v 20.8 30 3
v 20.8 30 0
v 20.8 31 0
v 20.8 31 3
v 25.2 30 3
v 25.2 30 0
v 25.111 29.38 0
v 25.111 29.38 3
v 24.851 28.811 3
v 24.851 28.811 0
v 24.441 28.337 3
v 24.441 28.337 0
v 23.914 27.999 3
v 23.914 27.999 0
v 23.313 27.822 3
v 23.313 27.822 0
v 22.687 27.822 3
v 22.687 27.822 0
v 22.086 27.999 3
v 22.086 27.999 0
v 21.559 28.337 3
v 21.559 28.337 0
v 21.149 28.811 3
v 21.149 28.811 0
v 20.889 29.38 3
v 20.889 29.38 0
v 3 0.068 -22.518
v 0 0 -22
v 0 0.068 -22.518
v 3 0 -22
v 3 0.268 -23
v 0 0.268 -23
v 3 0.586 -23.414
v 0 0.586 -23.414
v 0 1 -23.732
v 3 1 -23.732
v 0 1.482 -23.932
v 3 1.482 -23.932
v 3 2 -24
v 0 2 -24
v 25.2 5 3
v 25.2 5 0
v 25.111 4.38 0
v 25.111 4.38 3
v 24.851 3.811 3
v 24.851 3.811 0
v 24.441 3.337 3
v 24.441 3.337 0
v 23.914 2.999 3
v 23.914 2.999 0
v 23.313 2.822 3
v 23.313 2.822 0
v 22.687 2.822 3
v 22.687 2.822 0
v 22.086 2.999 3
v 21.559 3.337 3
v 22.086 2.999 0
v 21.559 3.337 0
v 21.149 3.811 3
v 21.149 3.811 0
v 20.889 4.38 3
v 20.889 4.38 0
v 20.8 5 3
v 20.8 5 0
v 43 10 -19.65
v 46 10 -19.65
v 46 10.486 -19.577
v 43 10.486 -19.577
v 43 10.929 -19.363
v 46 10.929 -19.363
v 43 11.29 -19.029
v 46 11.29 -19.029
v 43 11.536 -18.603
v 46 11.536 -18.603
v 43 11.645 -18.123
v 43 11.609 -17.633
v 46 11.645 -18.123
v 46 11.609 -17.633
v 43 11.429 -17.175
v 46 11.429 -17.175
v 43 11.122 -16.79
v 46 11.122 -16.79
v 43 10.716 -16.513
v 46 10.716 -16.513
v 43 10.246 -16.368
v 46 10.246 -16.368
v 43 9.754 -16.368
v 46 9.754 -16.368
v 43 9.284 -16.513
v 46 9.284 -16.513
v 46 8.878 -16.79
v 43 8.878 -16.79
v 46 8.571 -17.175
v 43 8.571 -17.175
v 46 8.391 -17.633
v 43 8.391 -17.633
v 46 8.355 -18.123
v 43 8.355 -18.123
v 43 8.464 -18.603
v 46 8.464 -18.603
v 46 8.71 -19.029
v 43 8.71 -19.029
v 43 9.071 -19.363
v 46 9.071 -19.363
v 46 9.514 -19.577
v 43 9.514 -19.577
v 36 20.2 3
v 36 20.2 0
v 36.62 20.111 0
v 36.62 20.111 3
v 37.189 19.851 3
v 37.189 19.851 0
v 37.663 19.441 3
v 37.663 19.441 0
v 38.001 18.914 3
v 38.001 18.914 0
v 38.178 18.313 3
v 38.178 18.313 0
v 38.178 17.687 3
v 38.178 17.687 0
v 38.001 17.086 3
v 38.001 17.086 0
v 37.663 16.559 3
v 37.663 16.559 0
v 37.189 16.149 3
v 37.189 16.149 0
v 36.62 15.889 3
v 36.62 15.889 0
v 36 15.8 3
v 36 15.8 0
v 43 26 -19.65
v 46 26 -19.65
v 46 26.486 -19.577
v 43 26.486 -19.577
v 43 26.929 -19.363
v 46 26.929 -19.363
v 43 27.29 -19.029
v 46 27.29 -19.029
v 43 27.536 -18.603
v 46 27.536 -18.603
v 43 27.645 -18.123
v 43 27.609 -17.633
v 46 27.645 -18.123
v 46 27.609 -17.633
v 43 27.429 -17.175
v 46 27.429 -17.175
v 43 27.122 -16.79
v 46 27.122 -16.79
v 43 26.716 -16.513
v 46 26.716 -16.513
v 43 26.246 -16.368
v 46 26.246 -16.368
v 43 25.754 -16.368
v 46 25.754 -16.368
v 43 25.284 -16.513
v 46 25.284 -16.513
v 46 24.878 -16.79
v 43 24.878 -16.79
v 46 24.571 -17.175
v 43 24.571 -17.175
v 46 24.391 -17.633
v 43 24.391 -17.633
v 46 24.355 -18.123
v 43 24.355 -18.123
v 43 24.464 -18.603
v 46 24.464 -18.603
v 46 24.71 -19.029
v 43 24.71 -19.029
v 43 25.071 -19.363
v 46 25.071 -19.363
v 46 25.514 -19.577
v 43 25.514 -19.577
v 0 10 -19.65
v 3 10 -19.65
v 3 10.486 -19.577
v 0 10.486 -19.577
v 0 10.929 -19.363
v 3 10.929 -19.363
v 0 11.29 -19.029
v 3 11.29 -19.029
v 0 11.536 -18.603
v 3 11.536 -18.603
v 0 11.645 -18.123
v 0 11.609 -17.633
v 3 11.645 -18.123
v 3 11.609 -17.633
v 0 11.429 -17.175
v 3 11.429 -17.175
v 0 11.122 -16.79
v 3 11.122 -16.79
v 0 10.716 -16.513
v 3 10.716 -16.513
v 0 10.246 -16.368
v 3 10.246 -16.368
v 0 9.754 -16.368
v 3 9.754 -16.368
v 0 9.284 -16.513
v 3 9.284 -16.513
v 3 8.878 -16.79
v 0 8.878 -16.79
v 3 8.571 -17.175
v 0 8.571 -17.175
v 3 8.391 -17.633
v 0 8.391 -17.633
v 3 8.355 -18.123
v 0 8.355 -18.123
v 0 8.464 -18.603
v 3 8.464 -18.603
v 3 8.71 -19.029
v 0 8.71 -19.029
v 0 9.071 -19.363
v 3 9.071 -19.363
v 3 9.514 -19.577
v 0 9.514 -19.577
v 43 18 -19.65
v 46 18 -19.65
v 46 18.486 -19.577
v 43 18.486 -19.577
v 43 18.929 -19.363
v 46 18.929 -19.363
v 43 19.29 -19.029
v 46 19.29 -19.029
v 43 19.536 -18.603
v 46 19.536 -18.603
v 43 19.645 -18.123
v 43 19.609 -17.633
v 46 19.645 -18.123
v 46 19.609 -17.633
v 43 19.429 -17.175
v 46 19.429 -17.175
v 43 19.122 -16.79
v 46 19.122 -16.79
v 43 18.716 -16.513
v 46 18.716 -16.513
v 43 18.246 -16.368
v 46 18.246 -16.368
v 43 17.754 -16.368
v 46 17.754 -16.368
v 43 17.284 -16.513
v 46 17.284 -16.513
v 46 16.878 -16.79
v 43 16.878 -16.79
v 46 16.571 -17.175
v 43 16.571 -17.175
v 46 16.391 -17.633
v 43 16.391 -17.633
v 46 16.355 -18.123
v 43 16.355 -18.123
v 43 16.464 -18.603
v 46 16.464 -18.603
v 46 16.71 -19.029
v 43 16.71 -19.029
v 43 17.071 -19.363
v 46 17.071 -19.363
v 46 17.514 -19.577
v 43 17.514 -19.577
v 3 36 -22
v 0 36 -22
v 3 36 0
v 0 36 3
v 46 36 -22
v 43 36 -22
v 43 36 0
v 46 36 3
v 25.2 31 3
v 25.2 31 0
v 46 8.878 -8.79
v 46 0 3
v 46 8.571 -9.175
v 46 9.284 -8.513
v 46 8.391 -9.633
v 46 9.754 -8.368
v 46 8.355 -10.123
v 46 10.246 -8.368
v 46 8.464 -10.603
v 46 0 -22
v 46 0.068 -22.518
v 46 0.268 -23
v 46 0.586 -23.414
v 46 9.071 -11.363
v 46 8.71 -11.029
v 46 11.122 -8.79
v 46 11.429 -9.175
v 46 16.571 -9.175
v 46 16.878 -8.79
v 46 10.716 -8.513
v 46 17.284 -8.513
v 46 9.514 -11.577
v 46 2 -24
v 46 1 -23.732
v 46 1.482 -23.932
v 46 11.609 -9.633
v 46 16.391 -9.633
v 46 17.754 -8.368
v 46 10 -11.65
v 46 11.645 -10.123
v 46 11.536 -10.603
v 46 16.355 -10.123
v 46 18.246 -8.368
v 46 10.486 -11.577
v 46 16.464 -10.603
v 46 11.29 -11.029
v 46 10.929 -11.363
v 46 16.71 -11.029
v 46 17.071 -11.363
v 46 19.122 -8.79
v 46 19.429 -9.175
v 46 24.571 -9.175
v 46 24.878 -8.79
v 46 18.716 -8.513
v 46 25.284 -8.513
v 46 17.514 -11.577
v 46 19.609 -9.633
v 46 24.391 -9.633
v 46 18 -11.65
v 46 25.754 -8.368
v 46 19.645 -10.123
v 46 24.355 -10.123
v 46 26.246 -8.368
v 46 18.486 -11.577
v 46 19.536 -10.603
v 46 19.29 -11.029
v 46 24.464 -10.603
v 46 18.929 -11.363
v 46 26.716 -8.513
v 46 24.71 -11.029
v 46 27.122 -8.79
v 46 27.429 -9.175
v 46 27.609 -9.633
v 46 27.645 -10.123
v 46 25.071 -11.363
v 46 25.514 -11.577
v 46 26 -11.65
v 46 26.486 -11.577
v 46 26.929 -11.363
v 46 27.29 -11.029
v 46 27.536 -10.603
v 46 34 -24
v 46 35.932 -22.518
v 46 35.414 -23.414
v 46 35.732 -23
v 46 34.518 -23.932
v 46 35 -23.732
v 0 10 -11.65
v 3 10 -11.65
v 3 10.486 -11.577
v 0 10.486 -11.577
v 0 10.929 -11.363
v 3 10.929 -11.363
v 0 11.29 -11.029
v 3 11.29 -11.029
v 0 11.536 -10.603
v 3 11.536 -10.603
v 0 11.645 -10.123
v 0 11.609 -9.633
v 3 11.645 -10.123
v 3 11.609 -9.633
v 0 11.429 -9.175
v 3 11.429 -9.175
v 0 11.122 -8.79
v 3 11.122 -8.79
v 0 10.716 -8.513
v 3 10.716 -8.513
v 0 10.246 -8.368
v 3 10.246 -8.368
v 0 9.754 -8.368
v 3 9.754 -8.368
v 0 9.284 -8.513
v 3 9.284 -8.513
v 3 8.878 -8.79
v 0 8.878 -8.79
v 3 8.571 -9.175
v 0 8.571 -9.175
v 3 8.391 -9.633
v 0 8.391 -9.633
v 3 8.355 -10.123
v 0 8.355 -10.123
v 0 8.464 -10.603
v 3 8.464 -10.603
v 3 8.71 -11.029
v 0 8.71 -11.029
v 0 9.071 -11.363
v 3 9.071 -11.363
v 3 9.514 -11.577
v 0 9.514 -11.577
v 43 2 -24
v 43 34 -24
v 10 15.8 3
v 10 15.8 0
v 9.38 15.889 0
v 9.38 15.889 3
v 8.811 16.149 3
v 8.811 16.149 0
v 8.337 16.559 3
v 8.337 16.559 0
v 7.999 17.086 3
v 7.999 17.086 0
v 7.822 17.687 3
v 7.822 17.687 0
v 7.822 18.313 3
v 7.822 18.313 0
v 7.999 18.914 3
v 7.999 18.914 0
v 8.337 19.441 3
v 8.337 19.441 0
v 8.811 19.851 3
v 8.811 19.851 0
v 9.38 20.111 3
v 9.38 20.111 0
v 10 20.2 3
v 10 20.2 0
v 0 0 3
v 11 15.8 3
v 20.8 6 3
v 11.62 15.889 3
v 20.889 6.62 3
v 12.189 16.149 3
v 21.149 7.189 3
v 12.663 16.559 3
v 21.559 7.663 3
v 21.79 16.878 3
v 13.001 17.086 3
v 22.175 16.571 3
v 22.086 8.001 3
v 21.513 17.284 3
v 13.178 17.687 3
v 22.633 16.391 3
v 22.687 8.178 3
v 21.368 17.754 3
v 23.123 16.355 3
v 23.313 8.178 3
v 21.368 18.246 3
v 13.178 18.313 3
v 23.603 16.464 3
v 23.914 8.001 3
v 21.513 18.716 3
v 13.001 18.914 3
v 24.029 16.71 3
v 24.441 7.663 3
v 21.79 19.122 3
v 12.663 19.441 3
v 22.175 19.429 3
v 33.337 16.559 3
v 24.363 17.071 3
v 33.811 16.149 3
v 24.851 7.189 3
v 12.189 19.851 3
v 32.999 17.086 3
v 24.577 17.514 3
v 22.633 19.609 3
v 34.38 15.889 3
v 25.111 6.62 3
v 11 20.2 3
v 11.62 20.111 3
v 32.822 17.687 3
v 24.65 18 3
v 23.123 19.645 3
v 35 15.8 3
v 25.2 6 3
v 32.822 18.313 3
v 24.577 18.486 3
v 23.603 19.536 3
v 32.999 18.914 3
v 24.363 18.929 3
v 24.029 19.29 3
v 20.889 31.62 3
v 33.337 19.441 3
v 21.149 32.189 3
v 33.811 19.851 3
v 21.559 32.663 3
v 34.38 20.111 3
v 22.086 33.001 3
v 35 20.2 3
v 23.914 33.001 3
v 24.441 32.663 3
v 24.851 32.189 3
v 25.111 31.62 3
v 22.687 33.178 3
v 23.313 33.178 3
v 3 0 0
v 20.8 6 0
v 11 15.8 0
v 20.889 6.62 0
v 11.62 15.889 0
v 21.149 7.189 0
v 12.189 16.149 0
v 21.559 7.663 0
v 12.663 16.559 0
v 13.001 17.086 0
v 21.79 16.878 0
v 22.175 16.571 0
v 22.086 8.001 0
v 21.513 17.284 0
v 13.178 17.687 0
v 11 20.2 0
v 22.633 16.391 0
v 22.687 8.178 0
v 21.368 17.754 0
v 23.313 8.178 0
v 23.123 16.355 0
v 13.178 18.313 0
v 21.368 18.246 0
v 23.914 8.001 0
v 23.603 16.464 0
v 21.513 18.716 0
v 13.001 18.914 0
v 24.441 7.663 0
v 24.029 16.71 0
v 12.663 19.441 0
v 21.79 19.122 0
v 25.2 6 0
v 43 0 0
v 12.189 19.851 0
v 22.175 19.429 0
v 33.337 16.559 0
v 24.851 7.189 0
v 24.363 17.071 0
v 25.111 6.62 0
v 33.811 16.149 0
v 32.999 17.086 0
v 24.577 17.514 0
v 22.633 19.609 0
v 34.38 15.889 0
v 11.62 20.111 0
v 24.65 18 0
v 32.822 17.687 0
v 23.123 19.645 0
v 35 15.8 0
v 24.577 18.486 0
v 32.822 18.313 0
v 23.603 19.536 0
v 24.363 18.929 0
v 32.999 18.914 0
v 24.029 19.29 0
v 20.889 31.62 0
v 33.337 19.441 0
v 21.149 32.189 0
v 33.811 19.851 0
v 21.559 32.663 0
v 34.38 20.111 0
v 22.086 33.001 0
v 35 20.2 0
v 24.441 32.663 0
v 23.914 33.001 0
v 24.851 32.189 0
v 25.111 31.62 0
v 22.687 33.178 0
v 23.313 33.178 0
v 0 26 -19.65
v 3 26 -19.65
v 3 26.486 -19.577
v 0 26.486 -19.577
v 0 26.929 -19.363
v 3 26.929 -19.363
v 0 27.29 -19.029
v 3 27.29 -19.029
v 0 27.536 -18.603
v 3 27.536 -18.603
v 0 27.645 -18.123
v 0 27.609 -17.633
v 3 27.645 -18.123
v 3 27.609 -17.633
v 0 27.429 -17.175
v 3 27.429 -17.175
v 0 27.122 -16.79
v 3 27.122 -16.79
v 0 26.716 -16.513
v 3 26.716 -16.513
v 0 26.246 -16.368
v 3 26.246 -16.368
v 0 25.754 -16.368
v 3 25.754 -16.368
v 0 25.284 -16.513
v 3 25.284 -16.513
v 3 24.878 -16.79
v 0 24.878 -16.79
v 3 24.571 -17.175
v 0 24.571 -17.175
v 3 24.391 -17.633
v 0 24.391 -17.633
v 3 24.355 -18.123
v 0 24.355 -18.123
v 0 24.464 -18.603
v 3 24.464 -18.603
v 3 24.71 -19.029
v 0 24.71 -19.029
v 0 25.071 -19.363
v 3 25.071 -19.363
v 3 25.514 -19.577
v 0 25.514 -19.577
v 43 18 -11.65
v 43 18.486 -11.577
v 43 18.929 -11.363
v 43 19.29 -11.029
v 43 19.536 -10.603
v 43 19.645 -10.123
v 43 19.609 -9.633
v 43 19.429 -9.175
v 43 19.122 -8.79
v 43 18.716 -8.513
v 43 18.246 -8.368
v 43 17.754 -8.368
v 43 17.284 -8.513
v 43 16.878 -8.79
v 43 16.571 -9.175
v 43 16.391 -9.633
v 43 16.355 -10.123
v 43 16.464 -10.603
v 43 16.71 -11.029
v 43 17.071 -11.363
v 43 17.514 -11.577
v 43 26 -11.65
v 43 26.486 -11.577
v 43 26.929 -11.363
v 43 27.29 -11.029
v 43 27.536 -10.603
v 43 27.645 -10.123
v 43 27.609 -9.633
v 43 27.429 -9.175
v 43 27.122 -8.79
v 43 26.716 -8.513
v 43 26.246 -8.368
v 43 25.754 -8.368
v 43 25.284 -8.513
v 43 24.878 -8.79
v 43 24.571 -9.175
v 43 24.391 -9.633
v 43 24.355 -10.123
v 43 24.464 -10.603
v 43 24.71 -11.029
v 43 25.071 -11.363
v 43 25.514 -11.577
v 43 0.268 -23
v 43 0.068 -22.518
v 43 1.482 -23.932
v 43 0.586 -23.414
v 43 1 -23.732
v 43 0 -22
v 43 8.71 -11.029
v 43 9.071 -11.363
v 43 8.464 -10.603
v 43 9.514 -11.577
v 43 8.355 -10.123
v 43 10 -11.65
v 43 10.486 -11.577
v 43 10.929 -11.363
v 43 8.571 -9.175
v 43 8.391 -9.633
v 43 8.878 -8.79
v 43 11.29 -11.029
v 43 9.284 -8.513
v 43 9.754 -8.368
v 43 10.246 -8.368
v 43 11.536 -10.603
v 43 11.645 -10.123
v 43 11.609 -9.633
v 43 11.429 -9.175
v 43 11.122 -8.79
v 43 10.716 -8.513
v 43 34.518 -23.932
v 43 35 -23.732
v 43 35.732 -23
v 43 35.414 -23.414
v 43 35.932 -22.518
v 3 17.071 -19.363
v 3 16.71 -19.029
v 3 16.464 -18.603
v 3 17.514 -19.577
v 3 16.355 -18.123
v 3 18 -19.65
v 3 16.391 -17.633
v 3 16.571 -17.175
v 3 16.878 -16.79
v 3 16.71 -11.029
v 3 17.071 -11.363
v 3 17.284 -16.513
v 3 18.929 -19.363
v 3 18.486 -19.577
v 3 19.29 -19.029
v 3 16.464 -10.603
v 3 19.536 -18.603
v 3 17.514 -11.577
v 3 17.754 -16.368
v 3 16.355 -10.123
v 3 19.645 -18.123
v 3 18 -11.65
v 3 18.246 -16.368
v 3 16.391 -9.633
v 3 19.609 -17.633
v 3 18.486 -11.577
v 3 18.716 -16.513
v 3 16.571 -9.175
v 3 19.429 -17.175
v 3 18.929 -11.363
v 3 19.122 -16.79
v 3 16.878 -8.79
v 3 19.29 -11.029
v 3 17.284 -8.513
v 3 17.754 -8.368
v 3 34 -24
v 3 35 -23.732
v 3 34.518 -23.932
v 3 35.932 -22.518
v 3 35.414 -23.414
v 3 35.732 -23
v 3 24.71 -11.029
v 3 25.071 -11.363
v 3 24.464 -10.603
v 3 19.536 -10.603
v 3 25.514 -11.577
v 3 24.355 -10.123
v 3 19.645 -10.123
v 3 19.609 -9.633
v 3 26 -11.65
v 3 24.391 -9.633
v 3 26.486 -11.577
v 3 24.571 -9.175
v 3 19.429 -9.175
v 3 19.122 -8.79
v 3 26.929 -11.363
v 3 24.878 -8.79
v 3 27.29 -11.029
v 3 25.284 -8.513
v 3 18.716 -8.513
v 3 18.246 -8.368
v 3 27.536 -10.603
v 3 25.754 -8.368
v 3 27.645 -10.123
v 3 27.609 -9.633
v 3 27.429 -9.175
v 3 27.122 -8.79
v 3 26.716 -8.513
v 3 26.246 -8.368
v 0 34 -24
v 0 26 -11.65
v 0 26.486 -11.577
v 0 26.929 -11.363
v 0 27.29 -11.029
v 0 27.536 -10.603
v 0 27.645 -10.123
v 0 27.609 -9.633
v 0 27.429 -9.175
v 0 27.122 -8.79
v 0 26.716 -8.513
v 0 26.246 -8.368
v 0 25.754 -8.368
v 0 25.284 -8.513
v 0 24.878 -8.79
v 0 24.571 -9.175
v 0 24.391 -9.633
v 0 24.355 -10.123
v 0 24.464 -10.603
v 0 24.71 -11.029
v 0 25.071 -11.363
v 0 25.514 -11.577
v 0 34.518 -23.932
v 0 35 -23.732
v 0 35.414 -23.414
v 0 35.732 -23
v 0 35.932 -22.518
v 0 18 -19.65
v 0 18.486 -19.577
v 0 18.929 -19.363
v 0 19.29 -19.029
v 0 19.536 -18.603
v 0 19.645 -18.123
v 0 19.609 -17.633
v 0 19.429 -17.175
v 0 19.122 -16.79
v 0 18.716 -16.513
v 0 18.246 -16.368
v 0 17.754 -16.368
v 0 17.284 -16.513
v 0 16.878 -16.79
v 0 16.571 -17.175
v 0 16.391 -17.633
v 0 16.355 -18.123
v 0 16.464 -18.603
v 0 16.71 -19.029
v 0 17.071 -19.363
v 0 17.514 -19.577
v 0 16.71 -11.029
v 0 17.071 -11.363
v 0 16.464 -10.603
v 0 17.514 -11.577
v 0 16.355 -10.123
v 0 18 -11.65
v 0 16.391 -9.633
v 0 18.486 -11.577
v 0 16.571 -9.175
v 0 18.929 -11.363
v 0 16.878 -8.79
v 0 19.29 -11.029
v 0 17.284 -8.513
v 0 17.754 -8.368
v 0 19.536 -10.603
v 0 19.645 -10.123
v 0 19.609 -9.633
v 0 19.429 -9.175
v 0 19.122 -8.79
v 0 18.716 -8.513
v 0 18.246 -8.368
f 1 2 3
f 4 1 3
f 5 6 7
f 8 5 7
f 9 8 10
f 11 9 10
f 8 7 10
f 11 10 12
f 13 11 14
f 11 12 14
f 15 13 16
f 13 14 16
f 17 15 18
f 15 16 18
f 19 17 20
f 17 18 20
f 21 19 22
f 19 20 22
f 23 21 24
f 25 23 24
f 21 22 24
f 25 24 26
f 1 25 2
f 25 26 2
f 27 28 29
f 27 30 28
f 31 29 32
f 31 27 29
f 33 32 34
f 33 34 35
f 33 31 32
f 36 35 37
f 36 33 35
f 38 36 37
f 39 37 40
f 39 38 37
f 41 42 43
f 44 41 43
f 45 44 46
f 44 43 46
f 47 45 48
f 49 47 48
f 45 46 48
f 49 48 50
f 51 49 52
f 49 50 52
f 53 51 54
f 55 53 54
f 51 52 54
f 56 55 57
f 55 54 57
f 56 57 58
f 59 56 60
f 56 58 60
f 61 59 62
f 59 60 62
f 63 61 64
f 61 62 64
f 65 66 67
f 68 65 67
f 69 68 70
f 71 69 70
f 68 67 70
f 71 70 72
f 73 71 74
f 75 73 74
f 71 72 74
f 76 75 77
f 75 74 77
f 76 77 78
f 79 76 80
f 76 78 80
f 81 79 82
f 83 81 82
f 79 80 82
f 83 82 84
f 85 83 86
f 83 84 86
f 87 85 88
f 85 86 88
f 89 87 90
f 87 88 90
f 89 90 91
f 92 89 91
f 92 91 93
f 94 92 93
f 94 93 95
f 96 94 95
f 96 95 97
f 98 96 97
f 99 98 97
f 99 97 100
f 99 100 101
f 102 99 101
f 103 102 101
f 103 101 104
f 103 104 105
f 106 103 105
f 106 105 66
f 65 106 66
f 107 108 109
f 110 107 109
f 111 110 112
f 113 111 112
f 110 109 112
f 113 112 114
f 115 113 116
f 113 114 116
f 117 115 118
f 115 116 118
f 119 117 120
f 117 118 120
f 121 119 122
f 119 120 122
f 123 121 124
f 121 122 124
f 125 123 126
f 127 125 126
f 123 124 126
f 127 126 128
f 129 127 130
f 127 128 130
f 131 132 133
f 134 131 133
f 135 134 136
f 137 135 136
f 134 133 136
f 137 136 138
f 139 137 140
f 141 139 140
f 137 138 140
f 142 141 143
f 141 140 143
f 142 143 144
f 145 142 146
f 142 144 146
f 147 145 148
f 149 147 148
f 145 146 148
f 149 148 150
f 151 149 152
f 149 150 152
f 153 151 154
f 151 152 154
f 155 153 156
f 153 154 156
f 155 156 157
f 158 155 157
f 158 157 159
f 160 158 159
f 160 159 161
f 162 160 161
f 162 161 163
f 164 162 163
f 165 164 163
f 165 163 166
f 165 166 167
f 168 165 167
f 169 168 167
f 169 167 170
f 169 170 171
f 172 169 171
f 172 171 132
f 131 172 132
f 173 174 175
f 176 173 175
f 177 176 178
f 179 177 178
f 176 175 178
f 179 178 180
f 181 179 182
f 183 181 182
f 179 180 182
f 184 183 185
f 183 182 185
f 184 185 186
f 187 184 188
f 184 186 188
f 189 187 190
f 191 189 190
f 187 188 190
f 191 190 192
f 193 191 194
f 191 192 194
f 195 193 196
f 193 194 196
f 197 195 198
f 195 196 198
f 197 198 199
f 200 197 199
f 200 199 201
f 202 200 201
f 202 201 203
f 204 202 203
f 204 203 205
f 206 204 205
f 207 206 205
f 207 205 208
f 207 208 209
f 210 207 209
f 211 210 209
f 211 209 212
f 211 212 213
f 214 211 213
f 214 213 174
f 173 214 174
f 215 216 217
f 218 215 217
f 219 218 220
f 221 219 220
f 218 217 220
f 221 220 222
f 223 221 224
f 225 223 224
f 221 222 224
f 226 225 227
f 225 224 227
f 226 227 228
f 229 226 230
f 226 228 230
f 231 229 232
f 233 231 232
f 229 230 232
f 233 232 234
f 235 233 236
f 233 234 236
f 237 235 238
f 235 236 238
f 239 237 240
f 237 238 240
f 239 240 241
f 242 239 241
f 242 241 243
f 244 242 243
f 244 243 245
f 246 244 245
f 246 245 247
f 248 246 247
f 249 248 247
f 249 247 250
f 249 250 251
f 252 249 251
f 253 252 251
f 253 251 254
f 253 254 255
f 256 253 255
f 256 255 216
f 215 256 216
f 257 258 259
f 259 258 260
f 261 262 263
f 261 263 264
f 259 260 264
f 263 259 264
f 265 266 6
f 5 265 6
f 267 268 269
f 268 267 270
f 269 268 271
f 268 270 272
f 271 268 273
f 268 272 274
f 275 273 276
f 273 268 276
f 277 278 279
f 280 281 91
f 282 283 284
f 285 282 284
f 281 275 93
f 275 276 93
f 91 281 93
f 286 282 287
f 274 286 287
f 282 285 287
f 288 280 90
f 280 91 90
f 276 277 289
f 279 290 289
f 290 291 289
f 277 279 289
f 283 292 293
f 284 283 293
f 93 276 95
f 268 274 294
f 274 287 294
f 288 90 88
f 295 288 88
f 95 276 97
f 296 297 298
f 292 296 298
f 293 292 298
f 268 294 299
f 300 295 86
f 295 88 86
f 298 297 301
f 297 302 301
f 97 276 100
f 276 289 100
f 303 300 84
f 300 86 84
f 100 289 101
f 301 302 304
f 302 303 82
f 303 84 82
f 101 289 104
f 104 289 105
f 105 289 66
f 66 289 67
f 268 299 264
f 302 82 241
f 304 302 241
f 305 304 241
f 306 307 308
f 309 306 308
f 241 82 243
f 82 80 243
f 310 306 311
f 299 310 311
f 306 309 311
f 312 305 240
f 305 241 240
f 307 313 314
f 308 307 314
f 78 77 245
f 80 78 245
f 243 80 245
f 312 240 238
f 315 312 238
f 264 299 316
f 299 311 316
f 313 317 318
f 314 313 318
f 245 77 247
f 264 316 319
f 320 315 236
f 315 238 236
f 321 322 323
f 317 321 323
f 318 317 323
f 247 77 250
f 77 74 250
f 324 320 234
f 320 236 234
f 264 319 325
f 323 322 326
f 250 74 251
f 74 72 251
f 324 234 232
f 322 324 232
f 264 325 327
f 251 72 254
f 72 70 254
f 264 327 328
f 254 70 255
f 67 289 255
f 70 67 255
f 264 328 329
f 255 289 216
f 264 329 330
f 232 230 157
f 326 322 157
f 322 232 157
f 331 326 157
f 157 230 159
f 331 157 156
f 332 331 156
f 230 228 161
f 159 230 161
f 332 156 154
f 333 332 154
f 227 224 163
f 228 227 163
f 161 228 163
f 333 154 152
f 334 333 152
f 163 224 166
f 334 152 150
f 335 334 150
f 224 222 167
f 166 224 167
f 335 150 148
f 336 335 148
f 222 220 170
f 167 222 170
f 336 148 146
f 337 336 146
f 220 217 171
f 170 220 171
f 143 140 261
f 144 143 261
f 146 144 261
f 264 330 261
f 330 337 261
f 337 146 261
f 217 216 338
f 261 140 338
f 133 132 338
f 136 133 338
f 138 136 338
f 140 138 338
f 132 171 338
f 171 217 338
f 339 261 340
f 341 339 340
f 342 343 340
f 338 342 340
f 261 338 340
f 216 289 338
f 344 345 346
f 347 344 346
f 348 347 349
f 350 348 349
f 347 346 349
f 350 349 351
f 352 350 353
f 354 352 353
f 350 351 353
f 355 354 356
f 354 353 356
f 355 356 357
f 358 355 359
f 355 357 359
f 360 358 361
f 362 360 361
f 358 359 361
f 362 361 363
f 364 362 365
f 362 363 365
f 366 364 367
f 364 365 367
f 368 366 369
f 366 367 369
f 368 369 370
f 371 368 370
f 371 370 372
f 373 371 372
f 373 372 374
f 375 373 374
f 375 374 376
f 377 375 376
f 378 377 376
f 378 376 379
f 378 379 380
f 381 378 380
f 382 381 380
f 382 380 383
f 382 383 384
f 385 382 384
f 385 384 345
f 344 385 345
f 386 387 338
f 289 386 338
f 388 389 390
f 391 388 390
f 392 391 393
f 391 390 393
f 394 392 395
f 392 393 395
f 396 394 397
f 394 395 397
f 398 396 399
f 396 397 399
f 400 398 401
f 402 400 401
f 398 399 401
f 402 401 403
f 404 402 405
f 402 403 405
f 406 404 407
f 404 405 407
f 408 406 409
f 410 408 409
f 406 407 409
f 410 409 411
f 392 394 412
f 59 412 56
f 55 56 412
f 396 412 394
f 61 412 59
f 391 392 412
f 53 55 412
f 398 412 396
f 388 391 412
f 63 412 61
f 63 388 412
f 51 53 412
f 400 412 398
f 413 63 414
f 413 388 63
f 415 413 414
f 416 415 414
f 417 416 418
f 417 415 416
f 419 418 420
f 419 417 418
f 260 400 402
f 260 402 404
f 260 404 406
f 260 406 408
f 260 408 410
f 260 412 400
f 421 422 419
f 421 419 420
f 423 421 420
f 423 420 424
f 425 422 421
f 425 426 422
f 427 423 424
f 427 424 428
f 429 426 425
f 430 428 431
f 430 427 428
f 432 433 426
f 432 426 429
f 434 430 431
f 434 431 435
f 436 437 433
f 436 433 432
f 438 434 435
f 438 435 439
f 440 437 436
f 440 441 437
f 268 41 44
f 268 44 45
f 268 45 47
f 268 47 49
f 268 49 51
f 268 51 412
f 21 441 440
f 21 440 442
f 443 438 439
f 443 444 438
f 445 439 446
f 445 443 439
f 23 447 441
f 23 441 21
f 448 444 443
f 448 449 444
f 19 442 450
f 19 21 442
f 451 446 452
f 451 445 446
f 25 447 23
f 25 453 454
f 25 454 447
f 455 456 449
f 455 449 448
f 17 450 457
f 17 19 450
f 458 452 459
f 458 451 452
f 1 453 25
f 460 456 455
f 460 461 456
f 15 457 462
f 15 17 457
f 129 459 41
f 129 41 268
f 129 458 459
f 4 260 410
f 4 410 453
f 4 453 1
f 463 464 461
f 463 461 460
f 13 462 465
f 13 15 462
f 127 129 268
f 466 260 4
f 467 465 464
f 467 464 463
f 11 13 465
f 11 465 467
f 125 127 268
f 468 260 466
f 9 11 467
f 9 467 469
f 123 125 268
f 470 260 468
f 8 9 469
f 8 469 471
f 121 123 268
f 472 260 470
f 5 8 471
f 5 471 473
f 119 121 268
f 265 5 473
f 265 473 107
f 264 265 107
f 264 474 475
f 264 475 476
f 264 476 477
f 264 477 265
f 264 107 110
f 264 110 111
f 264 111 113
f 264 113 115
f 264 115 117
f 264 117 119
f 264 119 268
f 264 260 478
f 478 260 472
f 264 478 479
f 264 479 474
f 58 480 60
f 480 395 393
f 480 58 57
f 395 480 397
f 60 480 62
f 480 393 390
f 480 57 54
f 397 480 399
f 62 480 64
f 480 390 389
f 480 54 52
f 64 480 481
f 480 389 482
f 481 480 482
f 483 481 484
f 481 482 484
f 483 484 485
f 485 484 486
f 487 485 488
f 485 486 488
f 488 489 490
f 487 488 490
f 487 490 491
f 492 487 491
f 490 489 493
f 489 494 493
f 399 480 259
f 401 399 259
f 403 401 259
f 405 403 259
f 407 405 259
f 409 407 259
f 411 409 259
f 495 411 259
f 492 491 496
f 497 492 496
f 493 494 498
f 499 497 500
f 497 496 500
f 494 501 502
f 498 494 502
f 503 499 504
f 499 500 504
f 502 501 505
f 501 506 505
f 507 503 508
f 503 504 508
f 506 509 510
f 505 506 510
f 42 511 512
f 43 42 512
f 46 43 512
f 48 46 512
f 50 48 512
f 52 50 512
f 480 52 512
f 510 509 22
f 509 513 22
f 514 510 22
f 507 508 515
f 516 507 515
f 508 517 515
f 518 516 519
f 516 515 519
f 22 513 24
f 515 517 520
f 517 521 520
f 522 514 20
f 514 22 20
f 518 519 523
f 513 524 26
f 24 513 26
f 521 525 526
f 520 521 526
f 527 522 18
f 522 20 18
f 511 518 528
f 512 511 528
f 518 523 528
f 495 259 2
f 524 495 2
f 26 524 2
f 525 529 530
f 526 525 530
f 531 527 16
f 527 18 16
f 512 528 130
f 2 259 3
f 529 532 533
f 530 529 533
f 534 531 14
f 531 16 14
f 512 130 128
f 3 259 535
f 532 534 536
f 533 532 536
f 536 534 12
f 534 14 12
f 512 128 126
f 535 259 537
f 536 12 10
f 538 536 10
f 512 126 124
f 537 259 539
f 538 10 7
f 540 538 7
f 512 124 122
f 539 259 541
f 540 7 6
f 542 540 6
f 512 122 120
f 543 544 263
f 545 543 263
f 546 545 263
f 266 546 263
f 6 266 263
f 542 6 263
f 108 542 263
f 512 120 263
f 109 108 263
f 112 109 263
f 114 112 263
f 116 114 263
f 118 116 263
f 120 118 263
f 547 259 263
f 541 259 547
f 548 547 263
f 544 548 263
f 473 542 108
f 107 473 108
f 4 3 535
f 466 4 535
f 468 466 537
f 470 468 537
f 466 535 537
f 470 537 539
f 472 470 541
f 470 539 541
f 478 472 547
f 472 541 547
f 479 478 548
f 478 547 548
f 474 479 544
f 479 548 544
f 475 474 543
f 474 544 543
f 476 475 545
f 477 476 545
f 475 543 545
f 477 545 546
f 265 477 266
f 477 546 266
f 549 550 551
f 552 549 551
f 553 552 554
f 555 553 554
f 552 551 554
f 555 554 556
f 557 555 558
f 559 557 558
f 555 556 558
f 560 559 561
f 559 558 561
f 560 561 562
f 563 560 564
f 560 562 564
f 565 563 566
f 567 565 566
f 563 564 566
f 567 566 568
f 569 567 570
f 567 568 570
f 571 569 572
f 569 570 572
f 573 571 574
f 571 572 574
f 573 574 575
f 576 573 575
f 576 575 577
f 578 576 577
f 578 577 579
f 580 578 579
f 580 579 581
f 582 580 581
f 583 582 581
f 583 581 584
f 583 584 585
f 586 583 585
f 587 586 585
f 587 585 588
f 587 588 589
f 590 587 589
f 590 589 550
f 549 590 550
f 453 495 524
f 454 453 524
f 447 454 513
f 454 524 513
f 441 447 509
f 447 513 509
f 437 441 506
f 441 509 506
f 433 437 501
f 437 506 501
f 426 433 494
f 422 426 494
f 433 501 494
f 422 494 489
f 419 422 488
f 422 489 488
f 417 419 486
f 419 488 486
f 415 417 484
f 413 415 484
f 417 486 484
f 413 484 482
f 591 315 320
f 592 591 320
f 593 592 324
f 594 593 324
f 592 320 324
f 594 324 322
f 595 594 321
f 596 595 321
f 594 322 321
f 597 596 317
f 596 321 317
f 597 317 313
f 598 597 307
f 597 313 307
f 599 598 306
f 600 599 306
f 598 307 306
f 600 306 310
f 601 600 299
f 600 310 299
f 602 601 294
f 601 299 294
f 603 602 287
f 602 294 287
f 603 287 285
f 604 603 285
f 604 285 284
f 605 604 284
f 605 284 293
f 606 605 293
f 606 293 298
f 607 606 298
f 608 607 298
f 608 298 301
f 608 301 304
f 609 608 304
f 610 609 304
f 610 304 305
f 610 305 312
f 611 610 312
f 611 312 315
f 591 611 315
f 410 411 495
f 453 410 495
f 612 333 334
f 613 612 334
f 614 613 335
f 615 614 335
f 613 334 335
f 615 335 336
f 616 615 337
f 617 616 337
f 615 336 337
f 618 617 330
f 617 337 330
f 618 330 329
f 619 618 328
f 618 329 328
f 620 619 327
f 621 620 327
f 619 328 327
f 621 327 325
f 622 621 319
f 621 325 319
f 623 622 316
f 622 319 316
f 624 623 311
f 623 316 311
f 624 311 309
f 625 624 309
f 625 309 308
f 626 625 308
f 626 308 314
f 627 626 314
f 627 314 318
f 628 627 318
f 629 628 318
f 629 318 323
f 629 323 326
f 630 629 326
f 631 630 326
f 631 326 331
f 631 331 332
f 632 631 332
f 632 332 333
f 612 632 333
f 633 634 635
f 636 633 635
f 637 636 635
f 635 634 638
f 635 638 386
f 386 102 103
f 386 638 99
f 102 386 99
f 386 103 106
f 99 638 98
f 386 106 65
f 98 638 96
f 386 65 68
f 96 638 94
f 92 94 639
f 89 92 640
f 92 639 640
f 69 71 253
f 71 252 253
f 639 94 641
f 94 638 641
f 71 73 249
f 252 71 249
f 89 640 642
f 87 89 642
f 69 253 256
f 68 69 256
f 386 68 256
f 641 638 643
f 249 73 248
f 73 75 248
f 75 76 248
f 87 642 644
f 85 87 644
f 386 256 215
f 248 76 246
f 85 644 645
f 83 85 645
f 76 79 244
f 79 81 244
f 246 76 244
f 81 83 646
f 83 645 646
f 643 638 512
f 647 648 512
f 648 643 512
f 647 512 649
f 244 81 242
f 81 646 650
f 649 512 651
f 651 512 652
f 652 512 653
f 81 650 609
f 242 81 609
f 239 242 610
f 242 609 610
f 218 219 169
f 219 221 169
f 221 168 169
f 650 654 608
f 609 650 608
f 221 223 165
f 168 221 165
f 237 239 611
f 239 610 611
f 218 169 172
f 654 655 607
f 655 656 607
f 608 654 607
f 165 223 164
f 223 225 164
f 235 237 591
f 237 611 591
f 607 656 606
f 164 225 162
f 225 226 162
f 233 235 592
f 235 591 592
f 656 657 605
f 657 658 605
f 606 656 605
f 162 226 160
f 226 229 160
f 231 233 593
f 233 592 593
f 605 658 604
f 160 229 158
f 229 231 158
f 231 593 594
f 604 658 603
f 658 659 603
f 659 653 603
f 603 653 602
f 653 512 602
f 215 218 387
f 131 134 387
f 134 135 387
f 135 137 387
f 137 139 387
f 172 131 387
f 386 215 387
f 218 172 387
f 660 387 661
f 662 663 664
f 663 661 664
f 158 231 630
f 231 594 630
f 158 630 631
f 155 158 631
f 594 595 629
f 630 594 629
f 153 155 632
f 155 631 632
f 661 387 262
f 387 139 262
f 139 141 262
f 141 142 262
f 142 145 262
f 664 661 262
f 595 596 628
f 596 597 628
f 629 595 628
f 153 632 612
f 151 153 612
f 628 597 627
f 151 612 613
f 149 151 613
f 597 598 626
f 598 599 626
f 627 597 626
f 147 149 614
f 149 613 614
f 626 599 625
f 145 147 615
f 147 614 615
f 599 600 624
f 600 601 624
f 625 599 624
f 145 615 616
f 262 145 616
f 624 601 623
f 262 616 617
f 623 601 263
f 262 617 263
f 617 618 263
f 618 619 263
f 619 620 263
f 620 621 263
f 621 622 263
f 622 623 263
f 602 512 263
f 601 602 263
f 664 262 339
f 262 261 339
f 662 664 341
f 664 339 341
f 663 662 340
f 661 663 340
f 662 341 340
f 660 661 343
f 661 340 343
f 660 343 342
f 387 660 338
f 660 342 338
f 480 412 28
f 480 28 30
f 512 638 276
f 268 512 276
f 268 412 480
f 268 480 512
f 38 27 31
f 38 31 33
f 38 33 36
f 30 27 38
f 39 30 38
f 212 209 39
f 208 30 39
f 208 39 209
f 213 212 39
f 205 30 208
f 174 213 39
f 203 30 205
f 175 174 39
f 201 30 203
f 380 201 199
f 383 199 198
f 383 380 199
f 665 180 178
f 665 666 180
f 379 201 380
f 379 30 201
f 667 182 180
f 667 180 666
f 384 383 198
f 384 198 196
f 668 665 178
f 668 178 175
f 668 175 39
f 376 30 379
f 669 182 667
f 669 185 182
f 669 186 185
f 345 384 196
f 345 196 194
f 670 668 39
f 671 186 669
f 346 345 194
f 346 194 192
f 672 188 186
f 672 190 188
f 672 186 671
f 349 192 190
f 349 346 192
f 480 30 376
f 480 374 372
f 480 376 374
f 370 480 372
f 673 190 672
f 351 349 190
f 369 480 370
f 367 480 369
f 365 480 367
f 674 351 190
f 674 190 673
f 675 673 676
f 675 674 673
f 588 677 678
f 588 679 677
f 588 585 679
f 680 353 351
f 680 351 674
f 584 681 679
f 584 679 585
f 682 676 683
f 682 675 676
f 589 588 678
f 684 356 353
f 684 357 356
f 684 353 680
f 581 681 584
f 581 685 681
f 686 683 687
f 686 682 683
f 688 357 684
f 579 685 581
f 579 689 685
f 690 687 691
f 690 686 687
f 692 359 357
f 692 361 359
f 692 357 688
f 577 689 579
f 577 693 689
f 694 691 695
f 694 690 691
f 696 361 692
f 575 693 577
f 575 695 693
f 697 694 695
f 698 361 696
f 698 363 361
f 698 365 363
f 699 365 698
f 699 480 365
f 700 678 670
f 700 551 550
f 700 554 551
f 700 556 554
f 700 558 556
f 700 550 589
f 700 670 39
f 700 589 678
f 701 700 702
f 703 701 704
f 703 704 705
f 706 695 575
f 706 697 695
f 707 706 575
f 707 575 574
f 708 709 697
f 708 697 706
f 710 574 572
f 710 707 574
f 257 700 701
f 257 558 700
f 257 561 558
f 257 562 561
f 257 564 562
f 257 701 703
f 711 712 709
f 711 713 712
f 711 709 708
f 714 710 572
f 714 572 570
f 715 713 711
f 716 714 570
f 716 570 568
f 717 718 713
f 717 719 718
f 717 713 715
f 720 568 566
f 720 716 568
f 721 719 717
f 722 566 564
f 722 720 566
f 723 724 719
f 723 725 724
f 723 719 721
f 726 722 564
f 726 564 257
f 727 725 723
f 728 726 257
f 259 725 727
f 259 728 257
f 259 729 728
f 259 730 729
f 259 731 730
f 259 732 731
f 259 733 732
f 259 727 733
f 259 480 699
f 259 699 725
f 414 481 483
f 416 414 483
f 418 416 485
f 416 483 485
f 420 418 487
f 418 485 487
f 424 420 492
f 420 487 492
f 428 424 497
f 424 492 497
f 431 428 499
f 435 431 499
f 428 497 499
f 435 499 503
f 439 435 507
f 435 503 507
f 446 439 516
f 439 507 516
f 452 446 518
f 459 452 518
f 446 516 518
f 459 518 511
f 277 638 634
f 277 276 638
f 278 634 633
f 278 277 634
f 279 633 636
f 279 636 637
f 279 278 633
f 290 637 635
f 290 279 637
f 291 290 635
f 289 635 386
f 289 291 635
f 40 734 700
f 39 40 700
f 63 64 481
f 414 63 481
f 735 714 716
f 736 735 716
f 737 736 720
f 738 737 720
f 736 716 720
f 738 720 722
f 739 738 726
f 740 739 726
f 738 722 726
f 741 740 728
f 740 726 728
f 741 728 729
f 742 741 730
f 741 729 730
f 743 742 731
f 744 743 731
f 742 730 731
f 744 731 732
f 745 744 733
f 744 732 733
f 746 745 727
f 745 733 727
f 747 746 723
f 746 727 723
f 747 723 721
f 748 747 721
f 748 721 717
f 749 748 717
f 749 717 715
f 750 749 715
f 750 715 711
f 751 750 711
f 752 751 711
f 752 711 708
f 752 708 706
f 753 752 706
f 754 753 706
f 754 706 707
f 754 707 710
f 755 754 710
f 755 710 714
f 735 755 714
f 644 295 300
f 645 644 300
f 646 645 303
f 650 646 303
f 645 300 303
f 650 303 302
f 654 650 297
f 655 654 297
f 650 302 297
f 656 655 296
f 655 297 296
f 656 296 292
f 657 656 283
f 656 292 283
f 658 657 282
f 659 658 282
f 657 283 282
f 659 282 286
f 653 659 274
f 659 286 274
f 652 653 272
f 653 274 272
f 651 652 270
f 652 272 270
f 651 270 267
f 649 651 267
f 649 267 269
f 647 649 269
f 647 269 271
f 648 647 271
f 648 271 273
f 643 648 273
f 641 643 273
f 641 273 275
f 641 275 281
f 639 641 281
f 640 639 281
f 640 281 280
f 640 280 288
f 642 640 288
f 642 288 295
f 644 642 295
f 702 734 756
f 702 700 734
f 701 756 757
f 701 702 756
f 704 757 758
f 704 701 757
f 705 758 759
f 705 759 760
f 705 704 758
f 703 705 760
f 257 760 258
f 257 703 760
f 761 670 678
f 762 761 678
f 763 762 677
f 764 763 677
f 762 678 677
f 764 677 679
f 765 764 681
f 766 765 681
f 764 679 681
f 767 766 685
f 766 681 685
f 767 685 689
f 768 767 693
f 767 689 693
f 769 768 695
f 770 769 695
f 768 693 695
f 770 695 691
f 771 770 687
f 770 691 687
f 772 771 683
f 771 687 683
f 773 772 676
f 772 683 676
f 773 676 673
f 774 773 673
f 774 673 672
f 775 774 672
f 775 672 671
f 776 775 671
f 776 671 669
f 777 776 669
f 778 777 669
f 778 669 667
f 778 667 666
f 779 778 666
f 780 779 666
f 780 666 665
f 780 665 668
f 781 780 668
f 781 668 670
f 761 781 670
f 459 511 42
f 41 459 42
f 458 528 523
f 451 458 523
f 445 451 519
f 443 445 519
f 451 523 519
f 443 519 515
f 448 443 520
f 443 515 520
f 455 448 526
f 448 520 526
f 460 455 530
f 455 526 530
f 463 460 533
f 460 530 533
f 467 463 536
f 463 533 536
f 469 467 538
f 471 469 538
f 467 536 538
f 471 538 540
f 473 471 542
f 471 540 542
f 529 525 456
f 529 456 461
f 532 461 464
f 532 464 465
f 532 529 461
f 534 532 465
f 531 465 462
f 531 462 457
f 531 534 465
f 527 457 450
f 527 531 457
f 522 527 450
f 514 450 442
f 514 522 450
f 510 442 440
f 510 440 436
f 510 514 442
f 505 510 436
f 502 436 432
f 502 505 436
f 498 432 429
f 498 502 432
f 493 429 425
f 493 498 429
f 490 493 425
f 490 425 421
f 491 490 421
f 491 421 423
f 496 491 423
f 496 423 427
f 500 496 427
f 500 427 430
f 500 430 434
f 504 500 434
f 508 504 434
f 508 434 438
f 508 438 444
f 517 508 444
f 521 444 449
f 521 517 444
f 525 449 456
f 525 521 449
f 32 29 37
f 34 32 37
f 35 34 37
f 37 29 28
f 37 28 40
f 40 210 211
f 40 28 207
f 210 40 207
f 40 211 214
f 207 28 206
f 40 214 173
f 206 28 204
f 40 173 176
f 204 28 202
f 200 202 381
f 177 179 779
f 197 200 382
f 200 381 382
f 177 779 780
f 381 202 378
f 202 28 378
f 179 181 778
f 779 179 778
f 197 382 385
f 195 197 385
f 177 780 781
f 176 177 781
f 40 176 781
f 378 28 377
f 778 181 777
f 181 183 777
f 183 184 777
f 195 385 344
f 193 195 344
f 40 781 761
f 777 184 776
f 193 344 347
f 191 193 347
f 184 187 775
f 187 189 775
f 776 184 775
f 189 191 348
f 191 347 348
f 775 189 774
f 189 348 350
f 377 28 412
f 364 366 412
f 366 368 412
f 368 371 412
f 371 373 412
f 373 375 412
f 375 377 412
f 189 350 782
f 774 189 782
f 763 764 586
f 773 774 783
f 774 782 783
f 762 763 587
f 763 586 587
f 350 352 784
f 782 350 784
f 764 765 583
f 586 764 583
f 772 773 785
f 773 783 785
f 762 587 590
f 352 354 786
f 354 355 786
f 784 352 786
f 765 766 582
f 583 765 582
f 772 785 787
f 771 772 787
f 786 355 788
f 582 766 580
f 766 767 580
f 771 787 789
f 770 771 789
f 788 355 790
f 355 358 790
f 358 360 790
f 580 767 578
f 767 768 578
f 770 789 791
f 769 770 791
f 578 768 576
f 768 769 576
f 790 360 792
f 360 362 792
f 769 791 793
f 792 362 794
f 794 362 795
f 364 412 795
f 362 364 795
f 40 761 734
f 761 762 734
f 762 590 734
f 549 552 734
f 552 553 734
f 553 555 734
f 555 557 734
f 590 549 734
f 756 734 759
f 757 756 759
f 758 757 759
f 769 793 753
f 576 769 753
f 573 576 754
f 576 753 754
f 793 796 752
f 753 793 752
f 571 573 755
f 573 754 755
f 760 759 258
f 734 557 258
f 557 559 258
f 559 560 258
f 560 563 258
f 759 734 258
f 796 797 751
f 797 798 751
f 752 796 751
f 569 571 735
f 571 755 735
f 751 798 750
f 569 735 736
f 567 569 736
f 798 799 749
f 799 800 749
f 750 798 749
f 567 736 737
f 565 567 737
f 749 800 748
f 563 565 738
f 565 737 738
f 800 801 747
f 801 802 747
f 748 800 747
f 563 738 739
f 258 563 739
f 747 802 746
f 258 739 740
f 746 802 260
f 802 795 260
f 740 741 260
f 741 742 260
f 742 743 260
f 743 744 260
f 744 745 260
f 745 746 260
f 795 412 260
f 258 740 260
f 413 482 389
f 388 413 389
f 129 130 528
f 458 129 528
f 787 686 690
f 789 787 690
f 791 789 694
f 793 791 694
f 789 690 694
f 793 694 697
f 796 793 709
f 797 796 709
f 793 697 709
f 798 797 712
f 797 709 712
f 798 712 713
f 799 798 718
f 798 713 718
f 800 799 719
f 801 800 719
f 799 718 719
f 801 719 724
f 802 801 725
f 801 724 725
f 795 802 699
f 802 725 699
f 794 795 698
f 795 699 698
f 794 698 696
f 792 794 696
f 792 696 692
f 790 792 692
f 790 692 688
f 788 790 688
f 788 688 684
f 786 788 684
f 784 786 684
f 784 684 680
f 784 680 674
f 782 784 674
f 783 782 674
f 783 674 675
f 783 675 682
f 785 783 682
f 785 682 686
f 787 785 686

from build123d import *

# Parameters (mm, degrees)
SKETCH_1_W          = 46
SKETCH_1_H          = 36
SKETCH_1_R          = 1.65
EXTRUDE_1_DEPTH     = 3
SKETCH_2_W          = 3
SKETCH_2_H          = 36
EXTRUDE_2_DEPTH     = 24
SKETCH_3_R          = 1.65
CUT_EXTRUDE_1_DEPTH = 50
FILLET_1_R          = 2


with BuildPart() as part:
    # 草图1 → 凸台-拉伸1 (new body)
    with BuildSketch(Plane.XY):
        with Locations((23, 18)):
            Rectangle(SKETCH_1_W, SKETCH_1_H)
        with BuildLine():
            Line((20.8, 30), (20.8, 31))
            ThreePointArc((20.8, 31), (23, 33.2), (25.2, 31))
            Line((25.2, 31), (25.2, 30))
            ThreePointArc((25.2, 30), (23, 27.8), (20.8, 30))
        make_face(mode=Mode.SUBTRACT)
        with BuildLine():
            ThreePointArc((36, 20.2), (38.2, 18), (36, 15.8))
            Line((36, 15.8), (35, 15.8))
            ThreePointArc((35, 15.8), (32.8, 18), (35, 20.2))
            Line((35, 20.2), (36, 20.2))
        make_face(mode=Mode.SUBTRACT)
        with BuildLine():
            ThreePointArc((25.2, 5), (23, 2.8), (20.8, 5))
            Line((20.8, 5), (20.8, 6))
            ThreePointArc((20.8, 6), (23, 8.2), (25.2, 6))
            Line((25.2, 6), (25.2, 5))
        make_face(mode=Mode.SUBTRACT)
        with BuildLine():
            ThreePointArc((10, 15.8), (7.8, 18), (10, 20.2))
            Line((10, 20.2), (11, 20.2))
            ThreePointArc((11, 20.2), (13.2, 18), (11, 15.8))
            Line((11, 15.8), (10, 15.8))
        make_face(mode=Mode.SUBTRACT)
        with Locations((23, 18)):
            Circle(SKETCH_1_R, mode=Mode.SUBTRACT)
    extrude(amount=EXTRUDE_1_DEPTH)

    # 草图2 → 凸台-拉伸2 (add)
    with BuildSketch(Plane.XY):
        with Locations((1.5, 18)):
            Rectangle(SKETCH_2_W, SKETCH_2_H)
        with Locations((44.5, 18)):
            Rectangle(SKETCH_2_W, SKETCH_2_H)
    extrude(amount=-EXTRUDE_2_DEPTH)

    # 草图3 → 切除-拉伸1 (cut)
    with BuildSketch(Plane(origin=(46, 0, 0), x_dir=(0, 0, -1), z_dir=(1, 0, 0))):
        with Locations((18, 10)):
            Circle(SKETCH_3_R)
        with Locations((10, 18)):
            Circle(SKETCH_3_R)
        with Locations((10, 10)):
            Circle(SKETCH_3_R)
        with Locations((18, 26)):
            Circle(SKETCH_3_R)
        with Locations((18, 18)):
            Circle(SKETCH_3_R)
        with Locations((10, 26)):
            Circle(SKETCH_3_R)
    extrude(amount=-CUT_EXTRUDE_1_DEPTH, mode=Mode.SUBTRACT)

    # 圆角1
    fillet_1_edges = [part.edges().sort_by_distance(p)[0] for p in [
        (1.5, 36, -24),
        (1.5, 0, -24),
        (44.5, 0, -24),
        (44.5, 36, -24),
    ]]
    fillet(fillet_1_edges, radius=FILLET_1_R)


solid = part.part
